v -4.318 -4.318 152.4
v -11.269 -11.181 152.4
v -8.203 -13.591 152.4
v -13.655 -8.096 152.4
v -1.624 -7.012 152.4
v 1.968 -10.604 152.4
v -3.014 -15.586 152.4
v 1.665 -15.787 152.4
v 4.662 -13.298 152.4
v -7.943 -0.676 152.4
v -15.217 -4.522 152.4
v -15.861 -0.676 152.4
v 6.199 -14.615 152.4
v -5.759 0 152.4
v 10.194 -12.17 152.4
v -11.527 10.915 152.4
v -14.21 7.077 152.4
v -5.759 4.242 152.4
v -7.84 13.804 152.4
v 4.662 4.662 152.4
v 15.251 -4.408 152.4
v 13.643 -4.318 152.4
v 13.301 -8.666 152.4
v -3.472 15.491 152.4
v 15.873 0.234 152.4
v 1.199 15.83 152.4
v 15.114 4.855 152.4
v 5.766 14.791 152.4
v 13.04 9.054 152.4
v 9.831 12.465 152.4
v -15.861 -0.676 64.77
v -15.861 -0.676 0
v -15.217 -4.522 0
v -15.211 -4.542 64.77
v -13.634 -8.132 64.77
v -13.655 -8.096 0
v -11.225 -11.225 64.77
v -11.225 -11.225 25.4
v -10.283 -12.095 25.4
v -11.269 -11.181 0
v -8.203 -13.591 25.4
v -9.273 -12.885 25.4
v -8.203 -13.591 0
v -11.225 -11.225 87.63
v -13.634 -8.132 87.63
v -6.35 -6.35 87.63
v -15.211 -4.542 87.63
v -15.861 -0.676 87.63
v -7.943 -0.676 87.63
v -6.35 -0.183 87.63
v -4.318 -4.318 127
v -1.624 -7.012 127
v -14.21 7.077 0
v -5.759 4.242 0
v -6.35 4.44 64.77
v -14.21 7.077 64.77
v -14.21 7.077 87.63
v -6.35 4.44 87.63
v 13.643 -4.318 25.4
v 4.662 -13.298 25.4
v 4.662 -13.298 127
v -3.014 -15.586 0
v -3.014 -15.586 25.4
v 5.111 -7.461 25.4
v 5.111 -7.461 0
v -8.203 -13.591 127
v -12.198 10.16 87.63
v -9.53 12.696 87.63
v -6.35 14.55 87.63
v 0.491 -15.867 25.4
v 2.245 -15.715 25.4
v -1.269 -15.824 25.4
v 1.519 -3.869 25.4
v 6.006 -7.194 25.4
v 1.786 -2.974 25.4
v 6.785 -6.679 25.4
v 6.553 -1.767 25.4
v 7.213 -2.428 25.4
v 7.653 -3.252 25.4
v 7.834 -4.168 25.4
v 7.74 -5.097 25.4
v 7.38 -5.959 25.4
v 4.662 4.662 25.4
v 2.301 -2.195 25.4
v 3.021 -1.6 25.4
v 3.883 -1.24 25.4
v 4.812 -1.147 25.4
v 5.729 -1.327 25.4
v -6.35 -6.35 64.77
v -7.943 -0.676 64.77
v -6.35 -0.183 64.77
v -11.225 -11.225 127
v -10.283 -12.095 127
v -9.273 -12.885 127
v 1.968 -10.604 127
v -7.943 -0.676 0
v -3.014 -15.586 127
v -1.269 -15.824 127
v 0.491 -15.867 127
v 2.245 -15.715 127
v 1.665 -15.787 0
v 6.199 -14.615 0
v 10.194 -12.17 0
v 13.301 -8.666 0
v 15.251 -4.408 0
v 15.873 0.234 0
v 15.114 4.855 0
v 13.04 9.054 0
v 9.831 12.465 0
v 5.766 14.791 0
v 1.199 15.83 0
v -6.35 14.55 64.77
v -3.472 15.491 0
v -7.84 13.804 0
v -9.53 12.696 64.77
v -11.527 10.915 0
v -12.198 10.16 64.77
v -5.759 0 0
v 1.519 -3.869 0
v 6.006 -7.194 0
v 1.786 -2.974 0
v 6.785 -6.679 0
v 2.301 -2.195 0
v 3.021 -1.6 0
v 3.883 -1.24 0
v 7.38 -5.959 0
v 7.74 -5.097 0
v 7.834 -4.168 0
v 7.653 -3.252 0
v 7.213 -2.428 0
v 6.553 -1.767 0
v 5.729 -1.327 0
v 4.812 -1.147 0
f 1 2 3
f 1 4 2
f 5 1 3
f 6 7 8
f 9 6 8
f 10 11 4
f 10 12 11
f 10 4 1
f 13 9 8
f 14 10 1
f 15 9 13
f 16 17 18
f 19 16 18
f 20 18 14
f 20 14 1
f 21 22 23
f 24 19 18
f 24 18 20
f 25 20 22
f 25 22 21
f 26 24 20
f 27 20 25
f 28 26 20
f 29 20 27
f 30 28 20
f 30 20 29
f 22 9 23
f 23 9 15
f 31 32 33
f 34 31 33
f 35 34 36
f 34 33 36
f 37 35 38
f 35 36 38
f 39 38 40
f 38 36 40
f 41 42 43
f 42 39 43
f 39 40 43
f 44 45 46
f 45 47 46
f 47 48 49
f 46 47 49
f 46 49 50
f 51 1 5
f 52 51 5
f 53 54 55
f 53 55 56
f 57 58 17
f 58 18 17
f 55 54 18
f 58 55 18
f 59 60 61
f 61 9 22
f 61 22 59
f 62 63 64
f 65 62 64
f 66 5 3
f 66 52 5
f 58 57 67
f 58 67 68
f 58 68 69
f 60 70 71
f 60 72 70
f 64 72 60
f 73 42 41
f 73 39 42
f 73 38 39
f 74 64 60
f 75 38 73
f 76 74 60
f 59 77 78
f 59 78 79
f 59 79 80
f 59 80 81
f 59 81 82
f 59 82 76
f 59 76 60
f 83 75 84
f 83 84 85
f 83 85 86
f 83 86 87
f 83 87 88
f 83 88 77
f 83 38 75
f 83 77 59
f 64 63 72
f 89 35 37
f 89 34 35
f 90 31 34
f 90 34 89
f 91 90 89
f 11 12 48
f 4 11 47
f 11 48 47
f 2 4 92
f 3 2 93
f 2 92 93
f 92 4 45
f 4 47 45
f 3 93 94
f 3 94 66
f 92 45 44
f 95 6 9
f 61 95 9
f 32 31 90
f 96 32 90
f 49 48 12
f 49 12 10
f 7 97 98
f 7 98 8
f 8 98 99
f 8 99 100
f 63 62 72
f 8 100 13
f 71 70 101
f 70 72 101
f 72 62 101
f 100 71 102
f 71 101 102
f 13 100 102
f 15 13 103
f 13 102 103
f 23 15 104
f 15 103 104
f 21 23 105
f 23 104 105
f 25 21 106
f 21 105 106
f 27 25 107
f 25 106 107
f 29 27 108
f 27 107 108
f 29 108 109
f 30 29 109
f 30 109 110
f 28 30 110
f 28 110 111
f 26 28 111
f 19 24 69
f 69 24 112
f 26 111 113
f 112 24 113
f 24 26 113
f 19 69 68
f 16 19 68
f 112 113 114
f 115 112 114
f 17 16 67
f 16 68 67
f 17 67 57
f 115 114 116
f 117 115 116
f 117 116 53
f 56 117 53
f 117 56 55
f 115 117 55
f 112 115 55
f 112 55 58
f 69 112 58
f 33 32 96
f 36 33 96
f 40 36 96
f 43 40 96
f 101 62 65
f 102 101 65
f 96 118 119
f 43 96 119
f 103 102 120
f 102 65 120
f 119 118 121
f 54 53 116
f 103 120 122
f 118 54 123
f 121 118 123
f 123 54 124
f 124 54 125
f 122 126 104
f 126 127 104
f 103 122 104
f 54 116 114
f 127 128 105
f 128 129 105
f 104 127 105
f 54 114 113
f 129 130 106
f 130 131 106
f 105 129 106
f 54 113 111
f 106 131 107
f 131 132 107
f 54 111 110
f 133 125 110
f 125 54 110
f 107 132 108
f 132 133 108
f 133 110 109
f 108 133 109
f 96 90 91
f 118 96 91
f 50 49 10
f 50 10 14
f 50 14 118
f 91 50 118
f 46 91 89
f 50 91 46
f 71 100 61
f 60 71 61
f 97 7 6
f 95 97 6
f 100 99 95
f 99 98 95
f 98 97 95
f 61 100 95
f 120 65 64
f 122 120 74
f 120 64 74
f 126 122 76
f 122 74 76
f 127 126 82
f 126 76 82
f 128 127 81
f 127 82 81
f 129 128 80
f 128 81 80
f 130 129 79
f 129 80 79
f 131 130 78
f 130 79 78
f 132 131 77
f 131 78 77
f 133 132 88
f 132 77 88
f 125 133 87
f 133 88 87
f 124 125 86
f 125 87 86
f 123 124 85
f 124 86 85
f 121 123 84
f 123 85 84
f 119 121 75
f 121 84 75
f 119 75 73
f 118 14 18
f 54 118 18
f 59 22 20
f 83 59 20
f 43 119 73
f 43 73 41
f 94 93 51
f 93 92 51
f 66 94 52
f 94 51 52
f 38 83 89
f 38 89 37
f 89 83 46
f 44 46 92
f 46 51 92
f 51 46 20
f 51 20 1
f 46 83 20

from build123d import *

# Parameters (mm, degrees)
F0_R           = 15.875
F1_DEPTH       = 152.4
F3_DEPTH       = 127
F4_R           = 3.175
F5_DEPTH       = 152.4
F8_DEPTH       = 101.6
F10_DEPTH      = 25.401
F10_DEPTH_BACK = 127.001
F12_DEPTH      = 152.401
F13_W          = 19.05
F13_H          = 22.86
F14_DEPTH      = 15.876
F14_DEPTH_BACK = 15.876


with BuildPart() as f1:
    # F0 (on Top) → F1 (new body)
    with BuildSketch(Plane.XY):
        Circle(F0_R)
    extrude(amount=F1_DEPTH)

    # F2 (on face) → F3 (cut)
    with BuildSketch(Plane.XY.offset(152.4)):
        Polygon((4.6622561211, 4.6622561211), (-4.318, -4.318), (4.6622561211, -13.2982561211), (13.6425122421, -4.318), align=None)
    extrude(amount=-F3_DEPTH, mode=Mode.SUBTRACT)

    # F4 (on face) → F5 (cut)
    with BuildSketch(Plane.XY.offset(152.4)):
        with Locations((4.6622561211, -4.318)):
            Circle(F4_R)
    extrude(amount=-F5_DEPTH, mode=Mode.SUBTRACT)

    # F7 (on offset) → F8 (cut)
    with BuildSketch(Plane.XY.offset(127)):
        Polygon((8.9802561211, -8.9802561211), (0, 0), (-17.9605122421, -17.9605122421), (-8.9802561211, -26.9407683632), align=None)
    extrude(amount=-F8_DEPTH, mode=Mode.SUBTRACT)

    # F9 (on face) → F10 (cut, two sides)
    with BuildSketch(Plane.XY.offset(25.4)) as f10_sk:
        Polygon((-6.8689398237, -19.4412983932), (5.1112689271, -7.4610896424), (1.5191664787, -3.8689871939), (-10.4610422721, -15.8491959447), align=None)
    extrude(amount=-F10_DEPTH, mode=Mode.SUBTRACT)
    extrude(f10_sk.sketch, amount=F10_DEPTH_BACK, mode=Mode.SUBTRACT)

    # F11 (on face) → F12 (cut, through all)
    with BuildSketch(Plane.XY.offset(152.4)):
        Polygon((-23.2781873974, 10.1192935667), (-26.9931931626, 10.1192935667), (-26.9931931626, -0.6757064333), (-7.9431931626, -0.6757064333), (-5.7593395008, 0), (-5.7593395008, 4.2418), align=None)
    extrude(amount=-F12_DEPTH, mode=Mode.SUBTRACT)

    # F13 (on Front) → F14 (cut, two sides)
    with BuildSketch(Plane.XZ) as f14_sk:
        with Locations((-15.875, 76.2)):
            Rectangle(F13_W, F13_H)
    extrude(amount=-F14_DEPTH, mode=Mode.SUBTRACT)
    extrude(f14_sk.sketch, amount=F14_DEPTH_BACK, mode=Mode.SUBTRACT)


solid = f1.part
